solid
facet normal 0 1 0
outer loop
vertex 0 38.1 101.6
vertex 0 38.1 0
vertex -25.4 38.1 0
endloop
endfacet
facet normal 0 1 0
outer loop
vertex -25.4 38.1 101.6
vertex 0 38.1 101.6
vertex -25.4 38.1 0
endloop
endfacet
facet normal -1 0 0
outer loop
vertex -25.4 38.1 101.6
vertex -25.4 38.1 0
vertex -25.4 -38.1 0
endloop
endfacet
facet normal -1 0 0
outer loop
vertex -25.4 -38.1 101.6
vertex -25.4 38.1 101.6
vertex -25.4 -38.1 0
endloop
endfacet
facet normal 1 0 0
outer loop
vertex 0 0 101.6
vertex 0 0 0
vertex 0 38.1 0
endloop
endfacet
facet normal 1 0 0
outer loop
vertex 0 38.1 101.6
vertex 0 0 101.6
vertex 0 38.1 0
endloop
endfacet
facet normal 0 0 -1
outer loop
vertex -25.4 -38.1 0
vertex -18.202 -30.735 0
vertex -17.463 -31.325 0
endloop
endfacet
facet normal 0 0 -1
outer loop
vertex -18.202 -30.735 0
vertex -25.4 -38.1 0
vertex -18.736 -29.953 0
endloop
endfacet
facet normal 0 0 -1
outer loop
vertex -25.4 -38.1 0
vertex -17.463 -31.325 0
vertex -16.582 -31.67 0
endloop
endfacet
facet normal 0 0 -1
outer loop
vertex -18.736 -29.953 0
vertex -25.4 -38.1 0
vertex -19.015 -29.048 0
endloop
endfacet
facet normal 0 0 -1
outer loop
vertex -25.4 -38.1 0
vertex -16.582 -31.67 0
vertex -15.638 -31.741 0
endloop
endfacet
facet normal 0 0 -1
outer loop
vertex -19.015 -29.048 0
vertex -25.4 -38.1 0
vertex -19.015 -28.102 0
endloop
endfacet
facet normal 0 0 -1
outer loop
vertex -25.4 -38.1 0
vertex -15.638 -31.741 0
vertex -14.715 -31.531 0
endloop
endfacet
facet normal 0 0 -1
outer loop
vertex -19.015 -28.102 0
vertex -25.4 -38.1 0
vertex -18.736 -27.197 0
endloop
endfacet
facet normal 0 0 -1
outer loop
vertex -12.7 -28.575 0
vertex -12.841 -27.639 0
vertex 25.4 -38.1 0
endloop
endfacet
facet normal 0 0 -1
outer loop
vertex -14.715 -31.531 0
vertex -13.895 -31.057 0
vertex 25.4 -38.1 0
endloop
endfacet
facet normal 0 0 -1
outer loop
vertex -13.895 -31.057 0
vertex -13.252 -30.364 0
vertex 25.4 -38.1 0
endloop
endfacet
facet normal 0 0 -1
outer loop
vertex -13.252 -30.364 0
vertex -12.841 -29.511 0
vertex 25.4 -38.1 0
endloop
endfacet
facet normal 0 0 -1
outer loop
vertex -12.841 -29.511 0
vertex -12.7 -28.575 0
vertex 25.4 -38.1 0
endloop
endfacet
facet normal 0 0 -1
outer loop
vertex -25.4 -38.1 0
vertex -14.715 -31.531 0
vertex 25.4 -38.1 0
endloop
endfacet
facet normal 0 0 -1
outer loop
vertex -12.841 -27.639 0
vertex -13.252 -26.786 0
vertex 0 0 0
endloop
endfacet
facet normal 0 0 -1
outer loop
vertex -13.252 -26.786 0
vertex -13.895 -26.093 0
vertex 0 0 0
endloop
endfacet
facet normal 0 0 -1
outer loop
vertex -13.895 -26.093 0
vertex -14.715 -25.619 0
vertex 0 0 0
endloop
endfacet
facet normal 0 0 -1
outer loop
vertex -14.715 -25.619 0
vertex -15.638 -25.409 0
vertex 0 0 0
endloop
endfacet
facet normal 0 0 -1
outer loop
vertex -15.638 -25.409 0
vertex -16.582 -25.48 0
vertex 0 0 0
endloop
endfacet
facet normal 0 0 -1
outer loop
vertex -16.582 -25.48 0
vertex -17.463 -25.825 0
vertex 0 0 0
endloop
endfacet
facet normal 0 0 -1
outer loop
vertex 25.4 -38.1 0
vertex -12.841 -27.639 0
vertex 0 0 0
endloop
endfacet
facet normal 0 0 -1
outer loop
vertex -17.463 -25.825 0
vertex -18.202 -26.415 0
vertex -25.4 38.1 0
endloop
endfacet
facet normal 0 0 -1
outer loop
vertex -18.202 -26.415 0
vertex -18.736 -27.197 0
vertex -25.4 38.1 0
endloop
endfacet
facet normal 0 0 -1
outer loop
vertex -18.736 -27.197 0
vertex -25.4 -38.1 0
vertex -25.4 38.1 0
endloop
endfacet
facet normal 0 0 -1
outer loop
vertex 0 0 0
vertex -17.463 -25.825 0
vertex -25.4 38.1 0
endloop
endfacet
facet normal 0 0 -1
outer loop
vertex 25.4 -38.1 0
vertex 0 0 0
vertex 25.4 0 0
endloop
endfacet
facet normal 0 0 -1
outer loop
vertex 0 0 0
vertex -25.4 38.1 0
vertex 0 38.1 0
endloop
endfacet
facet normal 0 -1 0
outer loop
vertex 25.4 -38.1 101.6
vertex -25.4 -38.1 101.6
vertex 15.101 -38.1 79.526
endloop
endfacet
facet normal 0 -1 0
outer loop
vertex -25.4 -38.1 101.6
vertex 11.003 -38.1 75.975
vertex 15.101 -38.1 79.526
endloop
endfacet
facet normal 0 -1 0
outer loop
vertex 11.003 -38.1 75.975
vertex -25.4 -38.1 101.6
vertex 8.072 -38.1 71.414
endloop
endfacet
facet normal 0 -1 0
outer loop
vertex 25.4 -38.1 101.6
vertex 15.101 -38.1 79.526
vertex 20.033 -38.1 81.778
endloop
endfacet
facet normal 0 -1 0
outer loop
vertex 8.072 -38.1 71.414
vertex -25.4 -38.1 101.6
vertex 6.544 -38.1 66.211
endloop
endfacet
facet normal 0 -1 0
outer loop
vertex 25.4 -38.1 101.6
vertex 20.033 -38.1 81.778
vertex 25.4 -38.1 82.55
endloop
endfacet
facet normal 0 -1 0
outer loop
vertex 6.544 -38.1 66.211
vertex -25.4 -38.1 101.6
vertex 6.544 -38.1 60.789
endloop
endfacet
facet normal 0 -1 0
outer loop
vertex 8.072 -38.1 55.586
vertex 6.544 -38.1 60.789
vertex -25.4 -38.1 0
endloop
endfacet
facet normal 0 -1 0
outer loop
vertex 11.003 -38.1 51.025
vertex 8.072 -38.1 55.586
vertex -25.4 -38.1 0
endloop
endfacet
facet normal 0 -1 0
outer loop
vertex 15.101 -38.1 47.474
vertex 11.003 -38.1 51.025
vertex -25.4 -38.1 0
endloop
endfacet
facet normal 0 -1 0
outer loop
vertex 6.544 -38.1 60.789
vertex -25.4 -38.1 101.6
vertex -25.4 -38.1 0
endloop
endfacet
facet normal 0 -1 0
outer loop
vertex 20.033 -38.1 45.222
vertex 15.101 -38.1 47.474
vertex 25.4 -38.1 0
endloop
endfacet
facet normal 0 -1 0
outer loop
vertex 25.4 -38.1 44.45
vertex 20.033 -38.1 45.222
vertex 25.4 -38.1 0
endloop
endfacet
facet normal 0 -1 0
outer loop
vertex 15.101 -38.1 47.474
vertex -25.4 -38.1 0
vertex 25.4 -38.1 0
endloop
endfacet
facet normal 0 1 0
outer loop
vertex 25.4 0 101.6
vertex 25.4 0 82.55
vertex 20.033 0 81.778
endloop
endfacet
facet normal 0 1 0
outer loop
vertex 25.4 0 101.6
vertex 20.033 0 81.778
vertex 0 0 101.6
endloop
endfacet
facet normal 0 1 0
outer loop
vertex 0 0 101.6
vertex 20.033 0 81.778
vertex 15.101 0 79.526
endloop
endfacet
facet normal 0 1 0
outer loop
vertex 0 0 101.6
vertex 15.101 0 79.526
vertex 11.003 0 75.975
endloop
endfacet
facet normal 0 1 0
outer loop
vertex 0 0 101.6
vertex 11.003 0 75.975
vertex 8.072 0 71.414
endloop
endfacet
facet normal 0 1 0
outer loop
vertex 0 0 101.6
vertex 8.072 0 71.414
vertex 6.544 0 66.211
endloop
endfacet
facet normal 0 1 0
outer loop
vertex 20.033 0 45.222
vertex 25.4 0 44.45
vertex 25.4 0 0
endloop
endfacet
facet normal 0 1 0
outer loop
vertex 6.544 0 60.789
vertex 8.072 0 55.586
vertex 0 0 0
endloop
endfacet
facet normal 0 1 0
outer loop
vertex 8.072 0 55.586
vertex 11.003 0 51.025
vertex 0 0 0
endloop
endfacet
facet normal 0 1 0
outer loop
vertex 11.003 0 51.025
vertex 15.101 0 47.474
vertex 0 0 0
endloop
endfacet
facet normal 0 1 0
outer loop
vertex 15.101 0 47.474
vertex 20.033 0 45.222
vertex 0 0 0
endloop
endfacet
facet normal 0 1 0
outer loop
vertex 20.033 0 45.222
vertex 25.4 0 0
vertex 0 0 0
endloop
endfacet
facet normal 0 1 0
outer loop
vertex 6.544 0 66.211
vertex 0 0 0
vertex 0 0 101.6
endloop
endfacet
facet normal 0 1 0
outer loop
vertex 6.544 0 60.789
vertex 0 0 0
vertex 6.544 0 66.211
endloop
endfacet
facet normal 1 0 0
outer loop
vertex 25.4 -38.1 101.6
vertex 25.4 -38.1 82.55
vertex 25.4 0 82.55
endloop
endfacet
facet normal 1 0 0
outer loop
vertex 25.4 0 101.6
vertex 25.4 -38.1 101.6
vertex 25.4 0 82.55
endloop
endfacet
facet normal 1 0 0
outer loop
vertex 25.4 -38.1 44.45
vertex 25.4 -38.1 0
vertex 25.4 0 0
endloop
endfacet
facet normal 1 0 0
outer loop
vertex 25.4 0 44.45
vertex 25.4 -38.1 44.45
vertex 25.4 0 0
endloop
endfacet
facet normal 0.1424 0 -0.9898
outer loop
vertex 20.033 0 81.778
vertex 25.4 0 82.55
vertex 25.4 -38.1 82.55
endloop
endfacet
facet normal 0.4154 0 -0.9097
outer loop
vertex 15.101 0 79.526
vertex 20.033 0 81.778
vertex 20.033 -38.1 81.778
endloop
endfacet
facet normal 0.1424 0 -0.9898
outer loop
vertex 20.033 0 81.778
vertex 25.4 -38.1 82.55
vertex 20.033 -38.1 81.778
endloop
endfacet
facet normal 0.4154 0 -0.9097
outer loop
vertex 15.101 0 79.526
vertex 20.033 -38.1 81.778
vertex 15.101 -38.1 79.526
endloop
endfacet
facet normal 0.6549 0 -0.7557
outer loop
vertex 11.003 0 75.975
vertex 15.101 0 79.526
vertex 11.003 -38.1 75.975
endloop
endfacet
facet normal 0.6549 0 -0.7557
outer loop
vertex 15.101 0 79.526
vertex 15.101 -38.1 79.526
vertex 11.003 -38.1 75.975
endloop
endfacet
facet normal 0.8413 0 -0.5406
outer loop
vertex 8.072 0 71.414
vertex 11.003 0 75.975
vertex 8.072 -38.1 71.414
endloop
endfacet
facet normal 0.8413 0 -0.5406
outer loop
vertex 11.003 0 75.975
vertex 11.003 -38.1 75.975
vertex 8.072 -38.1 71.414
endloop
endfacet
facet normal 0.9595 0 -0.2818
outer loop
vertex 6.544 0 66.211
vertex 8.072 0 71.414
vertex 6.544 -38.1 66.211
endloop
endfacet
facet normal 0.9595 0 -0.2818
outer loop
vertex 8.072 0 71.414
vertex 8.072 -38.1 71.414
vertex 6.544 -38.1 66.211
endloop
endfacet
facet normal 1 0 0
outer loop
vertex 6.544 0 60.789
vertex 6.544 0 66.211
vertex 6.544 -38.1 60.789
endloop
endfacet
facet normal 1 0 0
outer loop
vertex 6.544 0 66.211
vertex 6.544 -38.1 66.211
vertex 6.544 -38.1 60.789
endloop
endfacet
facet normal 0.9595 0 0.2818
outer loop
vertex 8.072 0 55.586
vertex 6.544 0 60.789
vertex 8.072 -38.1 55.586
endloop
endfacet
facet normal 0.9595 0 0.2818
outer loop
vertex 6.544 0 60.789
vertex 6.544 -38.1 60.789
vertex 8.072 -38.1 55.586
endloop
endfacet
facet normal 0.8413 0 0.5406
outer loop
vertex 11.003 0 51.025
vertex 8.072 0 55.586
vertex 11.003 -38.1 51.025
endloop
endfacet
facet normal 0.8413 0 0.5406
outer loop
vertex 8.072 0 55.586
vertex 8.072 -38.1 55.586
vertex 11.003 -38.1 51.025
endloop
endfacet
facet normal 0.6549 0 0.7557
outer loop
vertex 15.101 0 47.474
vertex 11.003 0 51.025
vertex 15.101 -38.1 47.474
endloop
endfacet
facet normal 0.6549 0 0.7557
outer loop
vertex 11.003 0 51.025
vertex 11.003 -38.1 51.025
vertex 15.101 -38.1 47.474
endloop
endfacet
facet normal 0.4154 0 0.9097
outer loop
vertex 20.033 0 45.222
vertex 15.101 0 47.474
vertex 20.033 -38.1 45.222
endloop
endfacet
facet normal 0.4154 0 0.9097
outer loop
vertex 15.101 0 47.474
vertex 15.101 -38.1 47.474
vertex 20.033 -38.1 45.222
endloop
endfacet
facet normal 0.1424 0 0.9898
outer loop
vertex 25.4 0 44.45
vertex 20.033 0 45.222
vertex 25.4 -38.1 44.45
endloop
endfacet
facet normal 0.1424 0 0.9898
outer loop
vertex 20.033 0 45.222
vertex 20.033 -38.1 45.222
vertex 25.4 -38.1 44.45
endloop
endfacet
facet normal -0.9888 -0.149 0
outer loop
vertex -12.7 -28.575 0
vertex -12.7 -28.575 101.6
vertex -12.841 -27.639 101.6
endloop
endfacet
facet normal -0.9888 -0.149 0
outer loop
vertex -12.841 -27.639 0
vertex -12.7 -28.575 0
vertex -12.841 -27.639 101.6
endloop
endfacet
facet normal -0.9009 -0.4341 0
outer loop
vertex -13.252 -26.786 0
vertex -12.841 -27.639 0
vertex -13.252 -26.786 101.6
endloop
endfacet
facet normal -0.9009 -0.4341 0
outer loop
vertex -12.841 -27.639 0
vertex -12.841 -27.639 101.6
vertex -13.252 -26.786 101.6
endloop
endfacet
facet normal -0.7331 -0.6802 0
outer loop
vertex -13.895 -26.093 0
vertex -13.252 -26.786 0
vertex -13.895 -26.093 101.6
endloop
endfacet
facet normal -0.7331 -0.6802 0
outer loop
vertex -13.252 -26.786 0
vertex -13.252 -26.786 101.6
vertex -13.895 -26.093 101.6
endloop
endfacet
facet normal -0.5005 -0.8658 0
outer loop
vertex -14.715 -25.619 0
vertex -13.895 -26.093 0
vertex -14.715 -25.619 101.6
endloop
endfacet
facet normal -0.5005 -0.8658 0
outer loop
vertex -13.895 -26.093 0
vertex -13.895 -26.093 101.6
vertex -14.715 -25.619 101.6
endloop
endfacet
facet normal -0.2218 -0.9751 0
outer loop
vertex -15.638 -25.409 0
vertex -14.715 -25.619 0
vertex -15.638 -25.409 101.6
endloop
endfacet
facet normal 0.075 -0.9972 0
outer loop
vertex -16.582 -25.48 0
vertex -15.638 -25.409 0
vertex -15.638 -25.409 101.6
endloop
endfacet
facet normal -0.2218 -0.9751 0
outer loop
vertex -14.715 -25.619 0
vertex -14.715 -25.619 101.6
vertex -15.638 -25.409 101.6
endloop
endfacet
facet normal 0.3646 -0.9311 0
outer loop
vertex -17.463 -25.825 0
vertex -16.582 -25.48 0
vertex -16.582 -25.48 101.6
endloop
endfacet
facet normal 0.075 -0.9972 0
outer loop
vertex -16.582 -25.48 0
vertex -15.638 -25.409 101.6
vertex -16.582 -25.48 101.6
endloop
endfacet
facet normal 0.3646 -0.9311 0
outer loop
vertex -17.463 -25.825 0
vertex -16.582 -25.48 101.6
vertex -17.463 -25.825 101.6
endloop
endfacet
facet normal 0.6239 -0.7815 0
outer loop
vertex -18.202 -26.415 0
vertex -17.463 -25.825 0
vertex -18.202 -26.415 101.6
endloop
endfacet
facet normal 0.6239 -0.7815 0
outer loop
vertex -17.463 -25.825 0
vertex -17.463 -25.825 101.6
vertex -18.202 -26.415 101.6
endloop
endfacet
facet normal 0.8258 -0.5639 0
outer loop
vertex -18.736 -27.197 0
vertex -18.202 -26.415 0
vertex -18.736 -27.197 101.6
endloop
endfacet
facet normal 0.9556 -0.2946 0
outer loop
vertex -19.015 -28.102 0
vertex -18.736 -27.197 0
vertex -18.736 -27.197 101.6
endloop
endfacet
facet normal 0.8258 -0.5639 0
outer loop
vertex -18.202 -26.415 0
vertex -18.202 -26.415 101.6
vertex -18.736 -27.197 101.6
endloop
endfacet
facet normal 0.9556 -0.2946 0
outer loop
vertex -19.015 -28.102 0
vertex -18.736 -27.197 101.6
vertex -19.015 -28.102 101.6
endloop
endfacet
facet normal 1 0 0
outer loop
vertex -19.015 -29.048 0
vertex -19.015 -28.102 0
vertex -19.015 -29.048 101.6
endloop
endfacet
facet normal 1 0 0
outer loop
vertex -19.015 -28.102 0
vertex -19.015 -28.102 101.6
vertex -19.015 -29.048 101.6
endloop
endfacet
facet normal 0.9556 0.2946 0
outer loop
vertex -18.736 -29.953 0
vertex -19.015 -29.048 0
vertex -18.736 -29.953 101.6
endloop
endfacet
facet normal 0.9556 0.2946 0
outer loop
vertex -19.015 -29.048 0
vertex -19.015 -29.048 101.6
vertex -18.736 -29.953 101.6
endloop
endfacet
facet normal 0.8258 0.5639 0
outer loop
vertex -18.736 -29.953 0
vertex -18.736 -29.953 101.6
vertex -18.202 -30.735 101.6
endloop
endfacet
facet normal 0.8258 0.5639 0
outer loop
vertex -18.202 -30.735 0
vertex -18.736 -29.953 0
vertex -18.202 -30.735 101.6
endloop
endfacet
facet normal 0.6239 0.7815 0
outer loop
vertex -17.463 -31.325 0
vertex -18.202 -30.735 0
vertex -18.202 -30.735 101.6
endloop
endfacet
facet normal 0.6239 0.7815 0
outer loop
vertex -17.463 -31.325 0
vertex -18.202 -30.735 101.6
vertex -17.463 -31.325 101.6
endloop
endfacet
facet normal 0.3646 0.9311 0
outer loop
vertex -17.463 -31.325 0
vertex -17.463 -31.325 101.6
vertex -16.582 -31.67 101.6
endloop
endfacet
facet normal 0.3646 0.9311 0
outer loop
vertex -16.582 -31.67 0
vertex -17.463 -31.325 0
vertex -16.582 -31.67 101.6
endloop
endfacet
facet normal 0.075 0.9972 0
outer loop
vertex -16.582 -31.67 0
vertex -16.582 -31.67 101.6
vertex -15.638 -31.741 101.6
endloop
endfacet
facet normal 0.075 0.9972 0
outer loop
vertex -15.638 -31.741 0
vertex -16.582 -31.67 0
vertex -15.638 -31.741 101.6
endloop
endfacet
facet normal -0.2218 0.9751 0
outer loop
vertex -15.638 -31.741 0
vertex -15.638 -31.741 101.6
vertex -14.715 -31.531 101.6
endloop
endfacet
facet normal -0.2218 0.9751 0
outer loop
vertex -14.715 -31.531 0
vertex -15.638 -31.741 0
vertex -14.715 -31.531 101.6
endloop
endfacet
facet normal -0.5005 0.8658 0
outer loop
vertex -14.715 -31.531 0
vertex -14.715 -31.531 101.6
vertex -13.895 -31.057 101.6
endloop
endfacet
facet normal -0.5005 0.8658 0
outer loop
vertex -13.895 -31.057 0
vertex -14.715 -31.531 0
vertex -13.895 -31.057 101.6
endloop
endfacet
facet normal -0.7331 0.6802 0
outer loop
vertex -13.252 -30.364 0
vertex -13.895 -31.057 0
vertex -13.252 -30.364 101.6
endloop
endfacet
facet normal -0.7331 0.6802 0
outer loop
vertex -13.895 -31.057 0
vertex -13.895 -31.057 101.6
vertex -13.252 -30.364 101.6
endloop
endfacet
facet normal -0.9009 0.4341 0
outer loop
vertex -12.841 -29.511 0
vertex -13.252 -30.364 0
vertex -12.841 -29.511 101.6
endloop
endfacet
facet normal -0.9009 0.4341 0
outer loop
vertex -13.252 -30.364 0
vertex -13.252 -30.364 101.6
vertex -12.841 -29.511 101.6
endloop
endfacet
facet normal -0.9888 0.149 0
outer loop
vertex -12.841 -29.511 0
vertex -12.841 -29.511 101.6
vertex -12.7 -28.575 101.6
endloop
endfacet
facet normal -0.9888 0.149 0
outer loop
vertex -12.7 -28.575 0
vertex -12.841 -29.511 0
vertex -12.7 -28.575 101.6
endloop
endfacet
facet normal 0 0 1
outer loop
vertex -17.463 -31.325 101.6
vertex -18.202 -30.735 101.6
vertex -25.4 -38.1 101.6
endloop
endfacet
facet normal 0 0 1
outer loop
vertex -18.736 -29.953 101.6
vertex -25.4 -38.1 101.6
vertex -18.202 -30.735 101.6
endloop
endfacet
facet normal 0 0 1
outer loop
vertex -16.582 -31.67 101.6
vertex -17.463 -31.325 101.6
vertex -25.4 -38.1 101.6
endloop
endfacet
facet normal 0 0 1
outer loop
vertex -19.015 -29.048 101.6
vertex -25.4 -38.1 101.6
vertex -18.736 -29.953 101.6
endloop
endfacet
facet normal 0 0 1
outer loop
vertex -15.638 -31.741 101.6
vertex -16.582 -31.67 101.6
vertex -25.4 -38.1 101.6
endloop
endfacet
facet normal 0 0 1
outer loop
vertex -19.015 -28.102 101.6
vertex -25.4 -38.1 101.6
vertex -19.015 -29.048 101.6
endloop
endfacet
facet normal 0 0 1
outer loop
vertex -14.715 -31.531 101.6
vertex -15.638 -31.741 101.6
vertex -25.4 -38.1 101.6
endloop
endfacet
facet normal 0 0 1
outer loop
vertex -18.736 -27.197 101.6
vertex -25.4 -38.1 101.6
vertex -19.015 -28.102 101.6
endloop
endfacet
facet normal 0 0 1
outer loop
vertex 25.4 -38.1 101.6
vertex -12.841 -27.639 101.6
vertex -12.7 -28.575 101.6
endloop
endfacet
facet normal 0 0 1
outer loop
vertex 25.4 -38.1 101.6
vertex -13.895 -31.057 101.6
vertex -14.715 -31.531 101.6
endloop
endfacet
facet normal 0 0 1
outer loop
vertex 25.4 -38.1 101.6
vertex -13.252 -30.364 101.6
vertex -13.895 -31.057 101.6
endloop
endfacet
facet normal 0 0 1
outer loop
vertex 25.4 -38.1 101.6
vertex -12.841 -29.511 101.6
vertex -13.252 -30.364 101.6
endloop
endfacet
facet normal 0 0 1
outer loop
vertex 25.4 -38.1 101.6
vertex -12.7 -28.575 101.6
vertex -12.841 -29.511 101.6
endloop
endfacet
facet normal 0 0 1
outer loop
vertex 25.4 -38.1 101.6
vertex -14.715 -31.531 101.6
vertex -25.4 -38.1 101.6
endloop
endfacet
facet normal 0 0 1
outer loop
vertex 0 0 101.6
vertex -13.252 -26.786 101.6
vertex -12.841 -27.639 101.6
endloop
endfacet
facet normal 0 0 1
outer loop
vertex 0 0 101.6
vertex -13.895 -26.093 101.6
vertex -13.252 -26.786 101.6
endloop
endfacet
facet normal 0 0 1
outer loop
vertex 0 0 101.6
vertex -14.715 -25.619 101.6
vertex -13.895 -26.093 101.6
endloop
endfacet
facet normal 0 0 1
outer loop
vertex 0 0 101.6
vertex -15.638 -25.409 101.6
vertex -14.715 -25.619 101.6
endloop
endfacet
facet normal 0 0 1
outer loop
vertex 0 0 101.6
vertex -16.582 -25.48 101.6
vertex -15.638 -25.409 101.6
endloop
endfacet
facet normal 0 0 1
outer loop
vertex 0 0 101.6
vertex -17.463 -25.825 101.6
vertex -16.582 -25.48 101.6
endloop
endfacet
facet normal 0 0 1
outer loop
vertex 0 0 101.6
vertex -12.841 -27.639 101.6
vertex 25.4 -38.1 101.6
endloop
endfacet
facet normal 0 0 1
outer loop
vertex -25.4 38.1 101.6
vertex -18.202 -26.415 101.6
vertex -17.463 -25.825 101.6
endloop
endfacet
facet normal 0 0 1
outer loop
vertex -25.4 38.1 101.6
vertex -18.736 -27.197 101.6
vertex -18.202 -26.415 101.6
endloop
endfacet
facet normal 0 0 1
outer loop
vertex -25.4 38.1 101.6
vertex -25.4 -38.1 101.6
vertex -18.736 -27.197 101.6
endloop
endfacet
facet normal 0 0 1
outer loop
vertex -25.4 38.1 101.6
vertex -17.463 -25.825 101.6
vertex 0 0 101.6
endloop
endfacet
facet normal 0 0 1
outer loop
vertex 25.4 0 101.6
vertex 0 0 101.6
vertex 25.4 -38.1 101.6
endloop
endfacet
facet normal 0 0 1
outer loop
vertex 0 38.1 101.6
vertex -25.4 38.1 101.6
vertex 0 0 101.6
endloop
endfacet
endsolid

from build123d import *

# Parameters (mm, degrees)
F1_DEPTH = 101.6
F2_R     = 3.175
F3_DEPTH = 101.6
F4_R     = 19.05
F5_DEPTH = 38.1


with BuildPart() as f1:
    # F0 (on Top) → F1 (new body)
    with BuildSketch(Plane.XY):
        Polygon((0, 0), (0, 38.1), (-25.4, 38.1), (-25.4, -38.1), (25.4, -38.1), (25.4, 0), align=None)
    extrude(amount=F1_DEPTH)

    # F2 (on face) → F3 (cut, through all)
    with BuildSketch(Plane.XY.offset(101.6)):
        with Locations((-15.875, -28.575)):
            Circle(F2_R)
    extrude(amount=-F3_DEPTH, mode=Mode.SUBTRACT)

    # F4 (on face) → F5 (cut, through all)
    with BuildSketch(Plane.XZ.offset(38.1)):
        with Locations((25.4, 63.5)):
            Circle(F4_R)
    extrude(amount=-F5_DEPTH, mode=Mode.SUBTRACT)


solid = f1.part
